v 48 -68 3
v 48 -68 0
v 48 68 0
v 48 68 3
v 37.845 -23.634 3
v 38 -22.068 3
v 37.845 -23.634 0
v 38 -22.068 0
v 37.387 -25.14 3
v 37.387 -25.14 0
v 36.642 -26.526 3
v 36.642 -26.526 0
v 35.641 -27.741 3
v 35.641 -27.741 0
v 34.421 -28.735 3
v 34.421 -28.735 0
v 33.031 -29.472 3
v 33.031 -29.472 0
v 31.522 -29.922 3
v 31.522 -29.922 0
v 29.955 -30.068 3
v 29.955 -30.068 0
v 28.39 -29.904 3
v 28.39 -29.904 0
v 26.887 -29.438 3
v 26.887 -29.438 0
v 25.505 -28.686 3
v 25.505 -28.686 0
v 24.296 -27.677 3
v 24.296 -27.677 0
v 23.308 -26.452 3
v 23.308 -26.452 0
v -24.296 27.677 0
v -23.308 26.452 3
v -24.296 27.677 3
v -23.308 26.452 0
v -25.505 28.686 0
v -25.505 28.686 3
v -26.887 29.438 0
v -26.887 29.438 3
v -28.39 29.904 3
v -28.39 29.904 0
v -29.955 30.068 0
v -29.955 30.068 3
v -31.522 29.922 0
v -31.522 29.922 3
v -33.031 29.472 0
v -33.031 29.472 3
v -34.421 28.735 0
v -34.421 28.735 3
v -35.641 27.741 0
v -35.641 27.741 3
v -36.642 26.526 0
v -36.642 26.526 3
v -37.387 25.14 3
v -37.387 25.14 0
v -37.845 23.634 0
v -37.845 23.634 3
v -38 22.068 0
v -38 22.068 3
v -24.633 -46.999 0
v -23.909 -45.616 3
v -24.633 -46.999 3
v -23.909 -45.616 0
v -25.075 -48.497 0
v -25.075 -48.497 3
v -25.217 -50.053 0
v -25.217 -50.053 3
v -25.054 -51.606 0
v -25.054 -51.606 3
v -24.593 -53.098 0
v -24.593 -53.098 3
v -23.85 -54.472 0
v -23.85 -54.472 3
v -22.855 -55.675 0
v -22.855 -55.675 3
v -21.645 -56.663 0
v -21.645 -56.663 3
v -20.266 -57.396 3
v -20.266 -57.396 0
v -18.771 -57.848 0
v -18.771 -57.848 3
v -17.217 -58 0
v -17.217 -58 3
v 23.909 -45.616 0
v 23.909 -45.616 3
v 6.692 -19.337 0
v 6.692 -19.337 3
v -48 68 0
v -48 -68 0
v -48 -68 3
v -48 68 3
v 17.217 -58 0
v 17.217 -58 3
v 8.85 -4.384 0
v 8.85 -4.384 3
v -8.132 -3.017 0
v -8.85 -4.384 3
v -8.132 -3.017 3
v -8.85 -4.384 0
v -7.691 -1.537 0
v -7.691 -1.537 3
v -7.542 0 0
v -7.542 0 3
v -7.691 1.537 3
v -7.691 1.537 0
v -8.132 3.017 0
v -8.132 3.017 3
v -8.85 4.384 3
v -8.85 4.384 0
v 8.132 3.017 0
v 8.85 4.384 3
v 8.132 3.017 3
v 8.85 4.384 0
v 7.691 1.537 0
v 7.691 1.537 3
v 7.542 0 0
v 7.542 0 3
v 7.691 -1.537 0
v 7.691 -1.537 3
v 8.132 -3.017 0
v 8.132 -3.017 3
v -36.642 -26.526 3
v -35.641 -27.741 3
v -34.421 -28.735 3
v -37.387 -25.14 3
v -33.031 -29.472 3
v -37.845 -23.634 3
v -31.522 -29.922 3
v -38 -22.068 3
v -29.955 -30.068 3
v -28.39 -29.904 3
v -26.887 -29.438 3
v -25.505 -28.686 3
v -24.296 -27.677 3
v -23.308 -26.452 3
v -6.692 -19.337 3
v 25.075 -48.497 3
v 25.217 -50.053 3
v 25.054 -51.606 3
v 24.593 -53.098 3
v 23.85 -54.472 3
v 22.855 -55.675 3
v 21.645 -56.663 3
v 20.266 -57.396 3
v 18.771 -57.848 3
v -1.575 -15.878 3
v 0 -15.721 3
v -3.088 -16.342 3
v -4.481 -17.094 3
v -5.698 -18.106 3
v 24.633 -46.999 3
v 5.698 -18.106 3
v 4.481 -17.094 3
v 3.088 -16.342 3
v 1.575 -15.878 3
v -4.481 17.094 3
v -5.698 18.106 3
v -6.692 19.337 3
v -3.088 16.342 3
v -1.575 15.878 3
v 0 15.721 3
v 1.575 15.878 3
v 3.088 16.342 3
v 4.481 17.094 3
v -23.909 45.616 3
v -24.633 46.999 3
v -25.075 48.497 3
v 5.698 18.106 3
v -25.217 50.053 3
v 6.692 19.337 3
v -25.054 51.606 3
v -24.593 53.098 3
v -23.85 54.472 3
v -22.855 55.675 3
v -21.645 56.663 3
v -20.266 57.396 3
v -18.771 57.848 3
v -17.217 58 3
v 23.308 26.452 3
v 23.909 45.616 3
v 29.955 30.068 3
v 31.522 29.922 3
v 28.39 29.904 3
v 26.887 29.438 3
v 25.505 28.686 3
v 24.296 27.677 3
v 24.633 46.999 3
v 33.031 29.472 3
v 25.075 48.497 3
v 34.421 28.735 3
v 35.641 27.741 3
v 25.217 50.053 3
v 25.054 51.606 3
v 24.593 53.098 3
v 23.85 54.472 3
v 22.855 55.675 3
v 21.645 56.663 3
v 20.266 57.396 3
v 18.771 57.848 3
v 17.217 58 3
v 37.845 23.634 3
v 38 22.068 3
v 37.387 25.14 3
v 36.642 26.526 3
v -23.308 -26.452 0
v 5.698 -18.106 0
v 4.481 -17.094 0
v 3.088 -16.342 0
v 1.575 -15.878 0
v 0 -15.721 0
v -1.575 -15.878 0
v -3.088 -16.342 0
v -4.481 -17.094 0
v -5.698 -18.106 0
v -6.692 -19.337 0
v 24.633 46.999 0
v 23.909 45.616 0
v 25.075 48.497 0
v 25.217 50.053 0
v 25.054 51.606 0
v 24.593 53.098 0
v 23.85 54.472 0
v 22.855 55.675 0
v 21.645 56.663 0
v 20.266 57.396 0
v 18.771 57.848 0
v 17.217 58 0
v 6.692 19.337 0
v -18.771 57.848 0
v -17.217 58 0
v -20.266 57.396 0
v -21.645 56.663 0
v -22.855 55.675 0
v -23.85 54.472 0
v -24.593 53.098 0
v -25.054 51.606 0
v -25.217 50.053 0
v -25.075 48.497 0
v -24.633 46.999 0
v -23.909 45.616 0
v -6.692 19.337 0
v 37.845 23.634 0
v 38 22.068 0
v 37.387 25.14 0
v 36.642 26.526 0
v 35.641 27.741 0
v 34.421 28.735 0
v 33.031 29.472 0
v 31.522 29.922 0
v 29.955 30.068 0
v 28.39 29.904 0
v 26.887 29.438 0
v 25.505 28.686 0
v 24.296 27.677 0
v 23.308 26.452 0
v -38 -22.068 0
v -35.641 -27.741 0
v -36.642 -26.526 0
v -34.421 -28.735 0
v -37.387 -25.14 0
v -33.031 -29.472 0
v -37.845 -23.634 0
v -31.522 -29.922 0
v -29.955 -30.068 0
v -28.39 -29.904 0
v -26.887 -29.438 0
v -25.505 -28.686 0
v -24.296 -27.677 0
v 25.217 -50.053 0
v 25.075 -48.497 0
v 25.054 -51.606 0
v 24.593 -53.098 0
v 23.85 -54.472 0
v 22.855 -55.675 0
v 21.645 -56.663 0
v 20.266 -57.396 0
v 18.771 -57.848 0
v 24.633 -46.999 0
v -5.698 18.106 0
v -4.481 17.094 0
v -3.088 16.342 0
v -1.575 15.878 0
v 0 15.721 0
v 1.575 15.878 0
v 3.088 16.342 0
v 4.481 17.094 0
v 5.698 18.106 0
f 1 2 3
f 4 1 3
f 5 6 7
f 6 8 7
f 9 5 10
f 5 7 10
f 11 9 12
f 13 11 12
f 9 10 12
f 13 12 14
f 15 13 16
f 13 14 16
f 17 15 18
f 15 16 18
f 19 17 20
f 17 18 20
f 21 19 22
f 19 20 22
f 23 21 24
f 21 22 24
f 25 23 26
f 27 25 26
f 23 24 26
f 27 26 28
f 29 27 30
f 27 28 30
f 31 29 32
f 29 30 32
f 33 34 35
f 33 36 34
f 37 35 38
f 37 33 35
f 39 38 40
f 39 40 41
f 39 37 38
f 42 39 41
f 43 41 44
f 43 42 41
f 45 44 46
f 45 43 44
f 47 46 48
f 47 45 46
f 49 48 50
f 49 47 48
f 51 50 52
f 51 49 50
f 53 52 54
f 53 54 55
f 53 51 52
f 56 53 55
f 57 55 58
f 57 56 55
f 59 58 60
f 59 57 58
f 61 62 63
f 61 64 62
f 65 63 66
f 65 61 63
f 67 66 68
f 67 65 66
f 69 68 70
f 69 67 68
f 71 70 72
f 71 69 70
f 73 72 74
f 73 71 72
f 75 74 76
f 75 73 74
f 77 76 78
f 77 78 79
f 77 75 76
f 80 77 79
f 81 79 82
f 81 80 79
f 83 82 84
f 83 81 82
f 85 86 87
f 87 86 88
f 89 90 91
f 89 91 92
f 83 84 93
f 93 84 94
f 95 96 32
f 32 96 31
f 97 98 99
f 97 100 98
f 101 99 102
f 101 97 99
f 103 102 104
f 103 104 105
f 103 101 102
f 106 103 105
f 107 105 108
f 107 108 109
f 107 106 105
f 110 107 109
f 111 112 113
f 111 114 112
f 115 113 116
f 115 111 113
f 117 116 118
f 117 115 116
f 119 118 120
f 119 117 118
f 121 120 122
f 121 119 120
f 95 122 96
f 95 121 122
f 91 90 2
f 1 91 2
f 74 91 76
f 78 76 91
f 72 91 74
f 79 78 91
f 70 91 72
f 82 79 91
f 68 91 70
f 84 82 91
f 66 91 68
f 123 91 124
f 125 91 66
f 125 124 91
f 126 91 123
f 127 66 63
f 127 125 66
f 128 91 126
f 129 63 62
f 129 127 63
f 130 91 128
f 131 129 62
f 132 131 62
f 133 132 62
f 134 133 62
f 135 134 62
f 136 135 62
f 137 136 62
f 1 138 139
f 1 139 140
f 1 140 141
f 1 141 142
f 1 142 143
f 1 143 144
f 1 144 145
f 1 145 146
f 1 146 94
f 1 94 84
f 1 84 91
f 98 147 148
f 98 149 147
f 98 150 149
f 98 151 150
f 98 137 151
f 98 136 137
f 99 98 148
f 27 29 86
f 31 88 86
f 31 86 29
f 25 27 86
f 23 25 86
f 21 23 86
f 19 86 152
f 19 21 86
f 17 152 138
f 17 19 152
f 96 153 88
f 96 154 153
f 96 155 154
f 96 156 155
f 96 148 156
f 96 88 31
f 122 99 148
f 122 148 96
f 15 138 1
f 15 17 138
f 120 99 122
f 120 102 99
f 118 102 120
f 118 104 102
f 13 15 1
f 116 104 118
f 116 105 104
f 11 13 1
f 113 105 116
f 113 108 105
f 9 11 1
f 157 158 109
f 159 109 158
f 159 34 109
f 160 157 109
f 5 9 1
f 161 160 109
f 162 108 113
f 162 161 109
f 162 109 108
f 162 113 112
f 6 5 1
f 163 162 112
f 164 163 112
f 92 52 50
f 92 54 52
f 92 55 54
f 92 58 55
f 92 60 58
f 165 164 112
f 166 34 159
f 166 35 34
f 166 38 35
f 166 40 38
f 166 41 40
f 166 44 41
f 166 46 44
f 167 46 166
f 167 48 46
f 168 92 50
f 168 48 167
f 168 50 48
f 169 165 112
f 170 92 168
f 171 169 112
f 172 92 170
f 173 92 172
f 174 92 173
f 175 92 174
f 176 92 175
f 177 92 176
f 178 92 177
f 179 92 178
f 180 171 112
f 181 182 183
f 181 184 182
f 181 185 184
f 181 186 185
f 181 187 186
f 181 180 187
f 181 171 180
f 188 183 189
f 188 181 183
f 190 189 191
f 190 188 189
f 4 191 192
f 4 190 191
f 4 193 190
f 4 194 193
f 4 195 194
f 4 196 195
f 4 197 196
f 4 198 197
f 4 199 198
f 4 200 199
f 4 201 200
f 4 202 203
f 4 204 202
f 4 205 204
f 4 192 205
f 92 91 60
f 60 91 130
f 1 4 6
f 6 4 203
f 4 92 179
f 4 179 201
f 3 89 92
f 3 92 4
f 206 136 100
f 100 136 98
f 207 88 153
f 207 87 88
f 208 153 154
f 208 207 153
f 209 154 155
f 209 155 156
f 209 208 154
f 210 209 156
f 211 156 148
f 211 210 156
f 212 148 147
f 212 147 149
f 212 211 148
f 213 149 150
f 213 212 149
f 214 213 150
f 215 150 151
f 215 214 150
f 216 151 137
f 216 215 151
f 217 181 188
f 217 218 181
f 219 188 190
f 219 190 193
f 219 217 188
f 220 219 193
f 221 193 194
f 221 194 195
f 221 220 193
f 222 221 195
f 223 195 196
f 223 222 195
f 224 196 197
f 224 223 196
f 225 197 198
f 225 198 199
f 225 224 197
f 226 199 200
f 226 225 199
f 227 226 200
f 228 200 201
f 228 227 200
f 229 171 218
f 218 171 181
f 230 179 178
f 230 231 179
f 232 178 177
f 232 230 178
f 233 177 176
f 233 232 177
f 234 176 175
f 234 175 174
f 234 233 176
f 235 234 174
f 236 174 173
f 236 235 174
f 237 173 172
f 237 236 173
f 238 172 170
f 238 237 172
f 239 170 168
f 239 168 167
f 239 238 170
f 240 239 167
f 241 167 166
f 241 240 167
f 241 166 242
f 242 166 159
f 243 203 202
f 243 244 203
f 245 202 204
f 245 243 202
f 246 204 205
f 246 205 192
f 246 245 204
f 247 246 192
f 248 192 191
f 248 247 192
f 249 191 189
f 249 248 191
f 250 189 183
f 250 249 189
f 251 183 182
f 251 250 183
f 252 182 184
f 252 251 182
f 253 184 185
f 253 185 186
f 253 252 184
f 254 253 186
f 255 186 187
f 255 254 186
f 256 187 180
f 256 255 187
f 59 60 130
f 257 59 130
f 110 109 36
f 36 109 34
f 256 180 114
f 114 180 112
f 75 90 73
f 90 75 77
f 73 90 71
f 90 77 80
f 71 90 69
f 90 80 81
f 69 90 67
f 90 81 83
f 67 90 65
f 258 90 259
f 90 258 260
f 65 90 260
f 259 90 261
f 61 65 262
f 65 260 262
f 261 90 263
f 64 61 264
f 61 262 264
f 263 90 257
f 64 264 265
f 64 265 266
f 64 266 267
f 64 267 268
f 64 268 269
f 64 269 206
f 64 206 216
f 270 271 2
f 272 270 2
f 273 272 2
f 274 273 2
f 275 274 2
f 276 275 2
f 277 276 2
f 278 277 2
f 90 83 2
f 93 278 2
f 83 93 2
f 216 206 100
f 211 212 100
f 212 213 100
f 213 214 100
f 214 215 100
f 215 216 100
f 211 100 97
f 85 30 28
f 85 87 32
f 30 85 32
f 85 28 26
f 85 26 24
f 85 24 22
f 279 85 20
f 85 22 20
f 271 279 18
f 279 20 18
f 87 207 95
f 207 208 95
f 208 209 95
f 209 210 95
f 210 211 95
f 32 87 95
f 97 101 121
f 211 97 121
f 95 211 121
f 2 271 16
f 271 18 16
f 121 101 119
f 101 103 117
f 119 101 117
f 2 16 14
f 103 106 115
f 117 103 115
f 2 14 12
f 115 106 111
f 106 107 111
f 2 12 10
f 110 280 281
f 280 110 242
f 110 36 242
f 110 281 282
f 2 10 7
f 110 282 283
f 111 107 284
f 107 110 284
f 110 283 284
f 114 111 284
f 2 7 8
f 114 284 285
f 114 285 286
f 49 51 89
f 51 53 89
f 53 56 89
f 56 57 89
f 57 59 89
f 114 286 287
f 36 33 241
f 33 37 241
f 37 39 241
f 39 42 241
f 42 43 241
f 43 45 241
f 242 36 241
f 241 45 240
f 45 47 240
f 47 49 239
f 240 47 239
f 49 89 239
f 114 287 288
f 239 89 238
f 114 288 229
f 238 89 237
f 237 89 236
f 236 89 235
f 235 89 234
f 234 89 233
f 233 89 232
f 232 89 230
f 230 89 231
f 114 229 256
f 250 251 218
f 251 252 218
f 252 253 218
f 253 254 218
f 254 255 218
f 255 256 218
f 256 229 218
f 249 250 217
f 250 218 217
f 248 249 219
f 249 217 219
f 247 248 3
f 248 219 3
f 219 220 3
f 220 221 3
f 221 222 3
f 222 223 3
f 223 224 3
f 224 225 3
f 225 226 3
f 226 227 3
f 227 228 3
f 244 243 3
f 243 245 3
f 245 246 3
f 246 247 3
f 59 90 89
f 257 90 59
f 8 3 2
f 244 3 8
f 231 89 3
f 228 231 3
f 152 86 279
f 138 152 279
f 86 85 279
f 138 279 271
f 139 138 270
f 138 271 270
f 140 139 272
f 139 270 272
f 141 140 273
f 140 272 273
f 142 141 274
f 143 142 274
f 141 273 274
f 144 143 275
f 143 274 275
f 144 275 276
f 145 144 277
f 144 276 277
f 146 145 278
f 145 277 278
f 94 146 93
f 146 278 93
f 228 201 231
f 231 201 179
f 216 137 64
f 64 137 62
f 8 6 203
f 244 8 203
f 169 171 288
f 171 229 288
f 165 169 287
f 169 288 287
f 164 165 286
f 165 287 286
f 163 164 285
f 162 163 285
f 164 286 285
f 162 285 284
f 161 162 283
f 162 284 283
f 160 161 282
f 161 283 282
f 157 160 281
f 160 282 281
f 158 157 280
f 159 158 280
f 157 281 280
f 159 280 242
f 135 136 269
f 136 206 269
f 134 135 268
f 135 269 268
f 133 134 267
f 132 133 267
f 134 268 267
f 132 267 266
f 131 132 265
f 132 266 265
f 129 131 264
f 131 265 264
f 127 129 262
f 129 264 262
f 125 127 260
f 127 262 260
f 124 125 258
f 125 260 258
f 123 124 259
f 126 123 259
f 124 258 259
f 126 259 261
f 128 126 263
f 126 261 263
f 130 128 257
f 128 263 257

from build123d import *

# Parameters (mm, degrees)
ESBO_O1_W                = 96
ESBO_O1_H                = 136
RESSALTO_EXTRUS_O1_DEPTH = 3
CORTE_EXTRUS_O1_DEPTH    = 10
FILETE1_R                = 8


with BuildPart() as part:
    # Esboço1 → Ressalto-extrusão1 (new body)
    with BuildSketch(Plane.XY):
        Rectangle(ESBO_O1_W, ESBO_O1_H)
    extrude(amount=RESSALTO_EXTRUS_O1_DEPTH)

    # Esboço2 → Corte-extrusão1 (cut)
    with BuildSketch(Plane.XY.offset(3)):
        Polygon((-38, -48.876349567), (-5.977564077, 0), (-38, 48.876349567), align=None)
        Polygon((0, 9.123650433), (32.022435923, 58), (-32.022435923, 58), align=None)
        Polygon((38, -48.876349567), (38, 48.876349567), (5.977564077, 0), align=None)
        Polygon((32.022435923, -58), (0, -9.123650433), (-32.022435923, -58), align=None)
    extrude(amount=-CORTE_EXTRUS_O1_DEPTH, mode=Mode.SUBTRACT)

    # Filete1
    filete1_edges = [part.edges().sort_by_distance(p)[0] for p in [
        (38, 48.876349567, 1.5),
        (38, -48.876349567, 1.5),
        (5.977564077, 0, 1.5),
        (-32.022435923, 58, 1.5),
        (32.022435923, 58, 1.5),
        (0, 9.123650433, 1.5),
        (0, -9.123650433, 1.5),
        (32.022435923, -58, 1.5),
        (-32.022435923, -58, 1.5),
        (-38, 48.876349567, 1.5),
        (-5.977564077, 0, 1.5),
        (-38, -48.876349567, 1.5),
    ]]
    fillet(filete1_edges, radius=FILETE1_R)


solid = part.part
